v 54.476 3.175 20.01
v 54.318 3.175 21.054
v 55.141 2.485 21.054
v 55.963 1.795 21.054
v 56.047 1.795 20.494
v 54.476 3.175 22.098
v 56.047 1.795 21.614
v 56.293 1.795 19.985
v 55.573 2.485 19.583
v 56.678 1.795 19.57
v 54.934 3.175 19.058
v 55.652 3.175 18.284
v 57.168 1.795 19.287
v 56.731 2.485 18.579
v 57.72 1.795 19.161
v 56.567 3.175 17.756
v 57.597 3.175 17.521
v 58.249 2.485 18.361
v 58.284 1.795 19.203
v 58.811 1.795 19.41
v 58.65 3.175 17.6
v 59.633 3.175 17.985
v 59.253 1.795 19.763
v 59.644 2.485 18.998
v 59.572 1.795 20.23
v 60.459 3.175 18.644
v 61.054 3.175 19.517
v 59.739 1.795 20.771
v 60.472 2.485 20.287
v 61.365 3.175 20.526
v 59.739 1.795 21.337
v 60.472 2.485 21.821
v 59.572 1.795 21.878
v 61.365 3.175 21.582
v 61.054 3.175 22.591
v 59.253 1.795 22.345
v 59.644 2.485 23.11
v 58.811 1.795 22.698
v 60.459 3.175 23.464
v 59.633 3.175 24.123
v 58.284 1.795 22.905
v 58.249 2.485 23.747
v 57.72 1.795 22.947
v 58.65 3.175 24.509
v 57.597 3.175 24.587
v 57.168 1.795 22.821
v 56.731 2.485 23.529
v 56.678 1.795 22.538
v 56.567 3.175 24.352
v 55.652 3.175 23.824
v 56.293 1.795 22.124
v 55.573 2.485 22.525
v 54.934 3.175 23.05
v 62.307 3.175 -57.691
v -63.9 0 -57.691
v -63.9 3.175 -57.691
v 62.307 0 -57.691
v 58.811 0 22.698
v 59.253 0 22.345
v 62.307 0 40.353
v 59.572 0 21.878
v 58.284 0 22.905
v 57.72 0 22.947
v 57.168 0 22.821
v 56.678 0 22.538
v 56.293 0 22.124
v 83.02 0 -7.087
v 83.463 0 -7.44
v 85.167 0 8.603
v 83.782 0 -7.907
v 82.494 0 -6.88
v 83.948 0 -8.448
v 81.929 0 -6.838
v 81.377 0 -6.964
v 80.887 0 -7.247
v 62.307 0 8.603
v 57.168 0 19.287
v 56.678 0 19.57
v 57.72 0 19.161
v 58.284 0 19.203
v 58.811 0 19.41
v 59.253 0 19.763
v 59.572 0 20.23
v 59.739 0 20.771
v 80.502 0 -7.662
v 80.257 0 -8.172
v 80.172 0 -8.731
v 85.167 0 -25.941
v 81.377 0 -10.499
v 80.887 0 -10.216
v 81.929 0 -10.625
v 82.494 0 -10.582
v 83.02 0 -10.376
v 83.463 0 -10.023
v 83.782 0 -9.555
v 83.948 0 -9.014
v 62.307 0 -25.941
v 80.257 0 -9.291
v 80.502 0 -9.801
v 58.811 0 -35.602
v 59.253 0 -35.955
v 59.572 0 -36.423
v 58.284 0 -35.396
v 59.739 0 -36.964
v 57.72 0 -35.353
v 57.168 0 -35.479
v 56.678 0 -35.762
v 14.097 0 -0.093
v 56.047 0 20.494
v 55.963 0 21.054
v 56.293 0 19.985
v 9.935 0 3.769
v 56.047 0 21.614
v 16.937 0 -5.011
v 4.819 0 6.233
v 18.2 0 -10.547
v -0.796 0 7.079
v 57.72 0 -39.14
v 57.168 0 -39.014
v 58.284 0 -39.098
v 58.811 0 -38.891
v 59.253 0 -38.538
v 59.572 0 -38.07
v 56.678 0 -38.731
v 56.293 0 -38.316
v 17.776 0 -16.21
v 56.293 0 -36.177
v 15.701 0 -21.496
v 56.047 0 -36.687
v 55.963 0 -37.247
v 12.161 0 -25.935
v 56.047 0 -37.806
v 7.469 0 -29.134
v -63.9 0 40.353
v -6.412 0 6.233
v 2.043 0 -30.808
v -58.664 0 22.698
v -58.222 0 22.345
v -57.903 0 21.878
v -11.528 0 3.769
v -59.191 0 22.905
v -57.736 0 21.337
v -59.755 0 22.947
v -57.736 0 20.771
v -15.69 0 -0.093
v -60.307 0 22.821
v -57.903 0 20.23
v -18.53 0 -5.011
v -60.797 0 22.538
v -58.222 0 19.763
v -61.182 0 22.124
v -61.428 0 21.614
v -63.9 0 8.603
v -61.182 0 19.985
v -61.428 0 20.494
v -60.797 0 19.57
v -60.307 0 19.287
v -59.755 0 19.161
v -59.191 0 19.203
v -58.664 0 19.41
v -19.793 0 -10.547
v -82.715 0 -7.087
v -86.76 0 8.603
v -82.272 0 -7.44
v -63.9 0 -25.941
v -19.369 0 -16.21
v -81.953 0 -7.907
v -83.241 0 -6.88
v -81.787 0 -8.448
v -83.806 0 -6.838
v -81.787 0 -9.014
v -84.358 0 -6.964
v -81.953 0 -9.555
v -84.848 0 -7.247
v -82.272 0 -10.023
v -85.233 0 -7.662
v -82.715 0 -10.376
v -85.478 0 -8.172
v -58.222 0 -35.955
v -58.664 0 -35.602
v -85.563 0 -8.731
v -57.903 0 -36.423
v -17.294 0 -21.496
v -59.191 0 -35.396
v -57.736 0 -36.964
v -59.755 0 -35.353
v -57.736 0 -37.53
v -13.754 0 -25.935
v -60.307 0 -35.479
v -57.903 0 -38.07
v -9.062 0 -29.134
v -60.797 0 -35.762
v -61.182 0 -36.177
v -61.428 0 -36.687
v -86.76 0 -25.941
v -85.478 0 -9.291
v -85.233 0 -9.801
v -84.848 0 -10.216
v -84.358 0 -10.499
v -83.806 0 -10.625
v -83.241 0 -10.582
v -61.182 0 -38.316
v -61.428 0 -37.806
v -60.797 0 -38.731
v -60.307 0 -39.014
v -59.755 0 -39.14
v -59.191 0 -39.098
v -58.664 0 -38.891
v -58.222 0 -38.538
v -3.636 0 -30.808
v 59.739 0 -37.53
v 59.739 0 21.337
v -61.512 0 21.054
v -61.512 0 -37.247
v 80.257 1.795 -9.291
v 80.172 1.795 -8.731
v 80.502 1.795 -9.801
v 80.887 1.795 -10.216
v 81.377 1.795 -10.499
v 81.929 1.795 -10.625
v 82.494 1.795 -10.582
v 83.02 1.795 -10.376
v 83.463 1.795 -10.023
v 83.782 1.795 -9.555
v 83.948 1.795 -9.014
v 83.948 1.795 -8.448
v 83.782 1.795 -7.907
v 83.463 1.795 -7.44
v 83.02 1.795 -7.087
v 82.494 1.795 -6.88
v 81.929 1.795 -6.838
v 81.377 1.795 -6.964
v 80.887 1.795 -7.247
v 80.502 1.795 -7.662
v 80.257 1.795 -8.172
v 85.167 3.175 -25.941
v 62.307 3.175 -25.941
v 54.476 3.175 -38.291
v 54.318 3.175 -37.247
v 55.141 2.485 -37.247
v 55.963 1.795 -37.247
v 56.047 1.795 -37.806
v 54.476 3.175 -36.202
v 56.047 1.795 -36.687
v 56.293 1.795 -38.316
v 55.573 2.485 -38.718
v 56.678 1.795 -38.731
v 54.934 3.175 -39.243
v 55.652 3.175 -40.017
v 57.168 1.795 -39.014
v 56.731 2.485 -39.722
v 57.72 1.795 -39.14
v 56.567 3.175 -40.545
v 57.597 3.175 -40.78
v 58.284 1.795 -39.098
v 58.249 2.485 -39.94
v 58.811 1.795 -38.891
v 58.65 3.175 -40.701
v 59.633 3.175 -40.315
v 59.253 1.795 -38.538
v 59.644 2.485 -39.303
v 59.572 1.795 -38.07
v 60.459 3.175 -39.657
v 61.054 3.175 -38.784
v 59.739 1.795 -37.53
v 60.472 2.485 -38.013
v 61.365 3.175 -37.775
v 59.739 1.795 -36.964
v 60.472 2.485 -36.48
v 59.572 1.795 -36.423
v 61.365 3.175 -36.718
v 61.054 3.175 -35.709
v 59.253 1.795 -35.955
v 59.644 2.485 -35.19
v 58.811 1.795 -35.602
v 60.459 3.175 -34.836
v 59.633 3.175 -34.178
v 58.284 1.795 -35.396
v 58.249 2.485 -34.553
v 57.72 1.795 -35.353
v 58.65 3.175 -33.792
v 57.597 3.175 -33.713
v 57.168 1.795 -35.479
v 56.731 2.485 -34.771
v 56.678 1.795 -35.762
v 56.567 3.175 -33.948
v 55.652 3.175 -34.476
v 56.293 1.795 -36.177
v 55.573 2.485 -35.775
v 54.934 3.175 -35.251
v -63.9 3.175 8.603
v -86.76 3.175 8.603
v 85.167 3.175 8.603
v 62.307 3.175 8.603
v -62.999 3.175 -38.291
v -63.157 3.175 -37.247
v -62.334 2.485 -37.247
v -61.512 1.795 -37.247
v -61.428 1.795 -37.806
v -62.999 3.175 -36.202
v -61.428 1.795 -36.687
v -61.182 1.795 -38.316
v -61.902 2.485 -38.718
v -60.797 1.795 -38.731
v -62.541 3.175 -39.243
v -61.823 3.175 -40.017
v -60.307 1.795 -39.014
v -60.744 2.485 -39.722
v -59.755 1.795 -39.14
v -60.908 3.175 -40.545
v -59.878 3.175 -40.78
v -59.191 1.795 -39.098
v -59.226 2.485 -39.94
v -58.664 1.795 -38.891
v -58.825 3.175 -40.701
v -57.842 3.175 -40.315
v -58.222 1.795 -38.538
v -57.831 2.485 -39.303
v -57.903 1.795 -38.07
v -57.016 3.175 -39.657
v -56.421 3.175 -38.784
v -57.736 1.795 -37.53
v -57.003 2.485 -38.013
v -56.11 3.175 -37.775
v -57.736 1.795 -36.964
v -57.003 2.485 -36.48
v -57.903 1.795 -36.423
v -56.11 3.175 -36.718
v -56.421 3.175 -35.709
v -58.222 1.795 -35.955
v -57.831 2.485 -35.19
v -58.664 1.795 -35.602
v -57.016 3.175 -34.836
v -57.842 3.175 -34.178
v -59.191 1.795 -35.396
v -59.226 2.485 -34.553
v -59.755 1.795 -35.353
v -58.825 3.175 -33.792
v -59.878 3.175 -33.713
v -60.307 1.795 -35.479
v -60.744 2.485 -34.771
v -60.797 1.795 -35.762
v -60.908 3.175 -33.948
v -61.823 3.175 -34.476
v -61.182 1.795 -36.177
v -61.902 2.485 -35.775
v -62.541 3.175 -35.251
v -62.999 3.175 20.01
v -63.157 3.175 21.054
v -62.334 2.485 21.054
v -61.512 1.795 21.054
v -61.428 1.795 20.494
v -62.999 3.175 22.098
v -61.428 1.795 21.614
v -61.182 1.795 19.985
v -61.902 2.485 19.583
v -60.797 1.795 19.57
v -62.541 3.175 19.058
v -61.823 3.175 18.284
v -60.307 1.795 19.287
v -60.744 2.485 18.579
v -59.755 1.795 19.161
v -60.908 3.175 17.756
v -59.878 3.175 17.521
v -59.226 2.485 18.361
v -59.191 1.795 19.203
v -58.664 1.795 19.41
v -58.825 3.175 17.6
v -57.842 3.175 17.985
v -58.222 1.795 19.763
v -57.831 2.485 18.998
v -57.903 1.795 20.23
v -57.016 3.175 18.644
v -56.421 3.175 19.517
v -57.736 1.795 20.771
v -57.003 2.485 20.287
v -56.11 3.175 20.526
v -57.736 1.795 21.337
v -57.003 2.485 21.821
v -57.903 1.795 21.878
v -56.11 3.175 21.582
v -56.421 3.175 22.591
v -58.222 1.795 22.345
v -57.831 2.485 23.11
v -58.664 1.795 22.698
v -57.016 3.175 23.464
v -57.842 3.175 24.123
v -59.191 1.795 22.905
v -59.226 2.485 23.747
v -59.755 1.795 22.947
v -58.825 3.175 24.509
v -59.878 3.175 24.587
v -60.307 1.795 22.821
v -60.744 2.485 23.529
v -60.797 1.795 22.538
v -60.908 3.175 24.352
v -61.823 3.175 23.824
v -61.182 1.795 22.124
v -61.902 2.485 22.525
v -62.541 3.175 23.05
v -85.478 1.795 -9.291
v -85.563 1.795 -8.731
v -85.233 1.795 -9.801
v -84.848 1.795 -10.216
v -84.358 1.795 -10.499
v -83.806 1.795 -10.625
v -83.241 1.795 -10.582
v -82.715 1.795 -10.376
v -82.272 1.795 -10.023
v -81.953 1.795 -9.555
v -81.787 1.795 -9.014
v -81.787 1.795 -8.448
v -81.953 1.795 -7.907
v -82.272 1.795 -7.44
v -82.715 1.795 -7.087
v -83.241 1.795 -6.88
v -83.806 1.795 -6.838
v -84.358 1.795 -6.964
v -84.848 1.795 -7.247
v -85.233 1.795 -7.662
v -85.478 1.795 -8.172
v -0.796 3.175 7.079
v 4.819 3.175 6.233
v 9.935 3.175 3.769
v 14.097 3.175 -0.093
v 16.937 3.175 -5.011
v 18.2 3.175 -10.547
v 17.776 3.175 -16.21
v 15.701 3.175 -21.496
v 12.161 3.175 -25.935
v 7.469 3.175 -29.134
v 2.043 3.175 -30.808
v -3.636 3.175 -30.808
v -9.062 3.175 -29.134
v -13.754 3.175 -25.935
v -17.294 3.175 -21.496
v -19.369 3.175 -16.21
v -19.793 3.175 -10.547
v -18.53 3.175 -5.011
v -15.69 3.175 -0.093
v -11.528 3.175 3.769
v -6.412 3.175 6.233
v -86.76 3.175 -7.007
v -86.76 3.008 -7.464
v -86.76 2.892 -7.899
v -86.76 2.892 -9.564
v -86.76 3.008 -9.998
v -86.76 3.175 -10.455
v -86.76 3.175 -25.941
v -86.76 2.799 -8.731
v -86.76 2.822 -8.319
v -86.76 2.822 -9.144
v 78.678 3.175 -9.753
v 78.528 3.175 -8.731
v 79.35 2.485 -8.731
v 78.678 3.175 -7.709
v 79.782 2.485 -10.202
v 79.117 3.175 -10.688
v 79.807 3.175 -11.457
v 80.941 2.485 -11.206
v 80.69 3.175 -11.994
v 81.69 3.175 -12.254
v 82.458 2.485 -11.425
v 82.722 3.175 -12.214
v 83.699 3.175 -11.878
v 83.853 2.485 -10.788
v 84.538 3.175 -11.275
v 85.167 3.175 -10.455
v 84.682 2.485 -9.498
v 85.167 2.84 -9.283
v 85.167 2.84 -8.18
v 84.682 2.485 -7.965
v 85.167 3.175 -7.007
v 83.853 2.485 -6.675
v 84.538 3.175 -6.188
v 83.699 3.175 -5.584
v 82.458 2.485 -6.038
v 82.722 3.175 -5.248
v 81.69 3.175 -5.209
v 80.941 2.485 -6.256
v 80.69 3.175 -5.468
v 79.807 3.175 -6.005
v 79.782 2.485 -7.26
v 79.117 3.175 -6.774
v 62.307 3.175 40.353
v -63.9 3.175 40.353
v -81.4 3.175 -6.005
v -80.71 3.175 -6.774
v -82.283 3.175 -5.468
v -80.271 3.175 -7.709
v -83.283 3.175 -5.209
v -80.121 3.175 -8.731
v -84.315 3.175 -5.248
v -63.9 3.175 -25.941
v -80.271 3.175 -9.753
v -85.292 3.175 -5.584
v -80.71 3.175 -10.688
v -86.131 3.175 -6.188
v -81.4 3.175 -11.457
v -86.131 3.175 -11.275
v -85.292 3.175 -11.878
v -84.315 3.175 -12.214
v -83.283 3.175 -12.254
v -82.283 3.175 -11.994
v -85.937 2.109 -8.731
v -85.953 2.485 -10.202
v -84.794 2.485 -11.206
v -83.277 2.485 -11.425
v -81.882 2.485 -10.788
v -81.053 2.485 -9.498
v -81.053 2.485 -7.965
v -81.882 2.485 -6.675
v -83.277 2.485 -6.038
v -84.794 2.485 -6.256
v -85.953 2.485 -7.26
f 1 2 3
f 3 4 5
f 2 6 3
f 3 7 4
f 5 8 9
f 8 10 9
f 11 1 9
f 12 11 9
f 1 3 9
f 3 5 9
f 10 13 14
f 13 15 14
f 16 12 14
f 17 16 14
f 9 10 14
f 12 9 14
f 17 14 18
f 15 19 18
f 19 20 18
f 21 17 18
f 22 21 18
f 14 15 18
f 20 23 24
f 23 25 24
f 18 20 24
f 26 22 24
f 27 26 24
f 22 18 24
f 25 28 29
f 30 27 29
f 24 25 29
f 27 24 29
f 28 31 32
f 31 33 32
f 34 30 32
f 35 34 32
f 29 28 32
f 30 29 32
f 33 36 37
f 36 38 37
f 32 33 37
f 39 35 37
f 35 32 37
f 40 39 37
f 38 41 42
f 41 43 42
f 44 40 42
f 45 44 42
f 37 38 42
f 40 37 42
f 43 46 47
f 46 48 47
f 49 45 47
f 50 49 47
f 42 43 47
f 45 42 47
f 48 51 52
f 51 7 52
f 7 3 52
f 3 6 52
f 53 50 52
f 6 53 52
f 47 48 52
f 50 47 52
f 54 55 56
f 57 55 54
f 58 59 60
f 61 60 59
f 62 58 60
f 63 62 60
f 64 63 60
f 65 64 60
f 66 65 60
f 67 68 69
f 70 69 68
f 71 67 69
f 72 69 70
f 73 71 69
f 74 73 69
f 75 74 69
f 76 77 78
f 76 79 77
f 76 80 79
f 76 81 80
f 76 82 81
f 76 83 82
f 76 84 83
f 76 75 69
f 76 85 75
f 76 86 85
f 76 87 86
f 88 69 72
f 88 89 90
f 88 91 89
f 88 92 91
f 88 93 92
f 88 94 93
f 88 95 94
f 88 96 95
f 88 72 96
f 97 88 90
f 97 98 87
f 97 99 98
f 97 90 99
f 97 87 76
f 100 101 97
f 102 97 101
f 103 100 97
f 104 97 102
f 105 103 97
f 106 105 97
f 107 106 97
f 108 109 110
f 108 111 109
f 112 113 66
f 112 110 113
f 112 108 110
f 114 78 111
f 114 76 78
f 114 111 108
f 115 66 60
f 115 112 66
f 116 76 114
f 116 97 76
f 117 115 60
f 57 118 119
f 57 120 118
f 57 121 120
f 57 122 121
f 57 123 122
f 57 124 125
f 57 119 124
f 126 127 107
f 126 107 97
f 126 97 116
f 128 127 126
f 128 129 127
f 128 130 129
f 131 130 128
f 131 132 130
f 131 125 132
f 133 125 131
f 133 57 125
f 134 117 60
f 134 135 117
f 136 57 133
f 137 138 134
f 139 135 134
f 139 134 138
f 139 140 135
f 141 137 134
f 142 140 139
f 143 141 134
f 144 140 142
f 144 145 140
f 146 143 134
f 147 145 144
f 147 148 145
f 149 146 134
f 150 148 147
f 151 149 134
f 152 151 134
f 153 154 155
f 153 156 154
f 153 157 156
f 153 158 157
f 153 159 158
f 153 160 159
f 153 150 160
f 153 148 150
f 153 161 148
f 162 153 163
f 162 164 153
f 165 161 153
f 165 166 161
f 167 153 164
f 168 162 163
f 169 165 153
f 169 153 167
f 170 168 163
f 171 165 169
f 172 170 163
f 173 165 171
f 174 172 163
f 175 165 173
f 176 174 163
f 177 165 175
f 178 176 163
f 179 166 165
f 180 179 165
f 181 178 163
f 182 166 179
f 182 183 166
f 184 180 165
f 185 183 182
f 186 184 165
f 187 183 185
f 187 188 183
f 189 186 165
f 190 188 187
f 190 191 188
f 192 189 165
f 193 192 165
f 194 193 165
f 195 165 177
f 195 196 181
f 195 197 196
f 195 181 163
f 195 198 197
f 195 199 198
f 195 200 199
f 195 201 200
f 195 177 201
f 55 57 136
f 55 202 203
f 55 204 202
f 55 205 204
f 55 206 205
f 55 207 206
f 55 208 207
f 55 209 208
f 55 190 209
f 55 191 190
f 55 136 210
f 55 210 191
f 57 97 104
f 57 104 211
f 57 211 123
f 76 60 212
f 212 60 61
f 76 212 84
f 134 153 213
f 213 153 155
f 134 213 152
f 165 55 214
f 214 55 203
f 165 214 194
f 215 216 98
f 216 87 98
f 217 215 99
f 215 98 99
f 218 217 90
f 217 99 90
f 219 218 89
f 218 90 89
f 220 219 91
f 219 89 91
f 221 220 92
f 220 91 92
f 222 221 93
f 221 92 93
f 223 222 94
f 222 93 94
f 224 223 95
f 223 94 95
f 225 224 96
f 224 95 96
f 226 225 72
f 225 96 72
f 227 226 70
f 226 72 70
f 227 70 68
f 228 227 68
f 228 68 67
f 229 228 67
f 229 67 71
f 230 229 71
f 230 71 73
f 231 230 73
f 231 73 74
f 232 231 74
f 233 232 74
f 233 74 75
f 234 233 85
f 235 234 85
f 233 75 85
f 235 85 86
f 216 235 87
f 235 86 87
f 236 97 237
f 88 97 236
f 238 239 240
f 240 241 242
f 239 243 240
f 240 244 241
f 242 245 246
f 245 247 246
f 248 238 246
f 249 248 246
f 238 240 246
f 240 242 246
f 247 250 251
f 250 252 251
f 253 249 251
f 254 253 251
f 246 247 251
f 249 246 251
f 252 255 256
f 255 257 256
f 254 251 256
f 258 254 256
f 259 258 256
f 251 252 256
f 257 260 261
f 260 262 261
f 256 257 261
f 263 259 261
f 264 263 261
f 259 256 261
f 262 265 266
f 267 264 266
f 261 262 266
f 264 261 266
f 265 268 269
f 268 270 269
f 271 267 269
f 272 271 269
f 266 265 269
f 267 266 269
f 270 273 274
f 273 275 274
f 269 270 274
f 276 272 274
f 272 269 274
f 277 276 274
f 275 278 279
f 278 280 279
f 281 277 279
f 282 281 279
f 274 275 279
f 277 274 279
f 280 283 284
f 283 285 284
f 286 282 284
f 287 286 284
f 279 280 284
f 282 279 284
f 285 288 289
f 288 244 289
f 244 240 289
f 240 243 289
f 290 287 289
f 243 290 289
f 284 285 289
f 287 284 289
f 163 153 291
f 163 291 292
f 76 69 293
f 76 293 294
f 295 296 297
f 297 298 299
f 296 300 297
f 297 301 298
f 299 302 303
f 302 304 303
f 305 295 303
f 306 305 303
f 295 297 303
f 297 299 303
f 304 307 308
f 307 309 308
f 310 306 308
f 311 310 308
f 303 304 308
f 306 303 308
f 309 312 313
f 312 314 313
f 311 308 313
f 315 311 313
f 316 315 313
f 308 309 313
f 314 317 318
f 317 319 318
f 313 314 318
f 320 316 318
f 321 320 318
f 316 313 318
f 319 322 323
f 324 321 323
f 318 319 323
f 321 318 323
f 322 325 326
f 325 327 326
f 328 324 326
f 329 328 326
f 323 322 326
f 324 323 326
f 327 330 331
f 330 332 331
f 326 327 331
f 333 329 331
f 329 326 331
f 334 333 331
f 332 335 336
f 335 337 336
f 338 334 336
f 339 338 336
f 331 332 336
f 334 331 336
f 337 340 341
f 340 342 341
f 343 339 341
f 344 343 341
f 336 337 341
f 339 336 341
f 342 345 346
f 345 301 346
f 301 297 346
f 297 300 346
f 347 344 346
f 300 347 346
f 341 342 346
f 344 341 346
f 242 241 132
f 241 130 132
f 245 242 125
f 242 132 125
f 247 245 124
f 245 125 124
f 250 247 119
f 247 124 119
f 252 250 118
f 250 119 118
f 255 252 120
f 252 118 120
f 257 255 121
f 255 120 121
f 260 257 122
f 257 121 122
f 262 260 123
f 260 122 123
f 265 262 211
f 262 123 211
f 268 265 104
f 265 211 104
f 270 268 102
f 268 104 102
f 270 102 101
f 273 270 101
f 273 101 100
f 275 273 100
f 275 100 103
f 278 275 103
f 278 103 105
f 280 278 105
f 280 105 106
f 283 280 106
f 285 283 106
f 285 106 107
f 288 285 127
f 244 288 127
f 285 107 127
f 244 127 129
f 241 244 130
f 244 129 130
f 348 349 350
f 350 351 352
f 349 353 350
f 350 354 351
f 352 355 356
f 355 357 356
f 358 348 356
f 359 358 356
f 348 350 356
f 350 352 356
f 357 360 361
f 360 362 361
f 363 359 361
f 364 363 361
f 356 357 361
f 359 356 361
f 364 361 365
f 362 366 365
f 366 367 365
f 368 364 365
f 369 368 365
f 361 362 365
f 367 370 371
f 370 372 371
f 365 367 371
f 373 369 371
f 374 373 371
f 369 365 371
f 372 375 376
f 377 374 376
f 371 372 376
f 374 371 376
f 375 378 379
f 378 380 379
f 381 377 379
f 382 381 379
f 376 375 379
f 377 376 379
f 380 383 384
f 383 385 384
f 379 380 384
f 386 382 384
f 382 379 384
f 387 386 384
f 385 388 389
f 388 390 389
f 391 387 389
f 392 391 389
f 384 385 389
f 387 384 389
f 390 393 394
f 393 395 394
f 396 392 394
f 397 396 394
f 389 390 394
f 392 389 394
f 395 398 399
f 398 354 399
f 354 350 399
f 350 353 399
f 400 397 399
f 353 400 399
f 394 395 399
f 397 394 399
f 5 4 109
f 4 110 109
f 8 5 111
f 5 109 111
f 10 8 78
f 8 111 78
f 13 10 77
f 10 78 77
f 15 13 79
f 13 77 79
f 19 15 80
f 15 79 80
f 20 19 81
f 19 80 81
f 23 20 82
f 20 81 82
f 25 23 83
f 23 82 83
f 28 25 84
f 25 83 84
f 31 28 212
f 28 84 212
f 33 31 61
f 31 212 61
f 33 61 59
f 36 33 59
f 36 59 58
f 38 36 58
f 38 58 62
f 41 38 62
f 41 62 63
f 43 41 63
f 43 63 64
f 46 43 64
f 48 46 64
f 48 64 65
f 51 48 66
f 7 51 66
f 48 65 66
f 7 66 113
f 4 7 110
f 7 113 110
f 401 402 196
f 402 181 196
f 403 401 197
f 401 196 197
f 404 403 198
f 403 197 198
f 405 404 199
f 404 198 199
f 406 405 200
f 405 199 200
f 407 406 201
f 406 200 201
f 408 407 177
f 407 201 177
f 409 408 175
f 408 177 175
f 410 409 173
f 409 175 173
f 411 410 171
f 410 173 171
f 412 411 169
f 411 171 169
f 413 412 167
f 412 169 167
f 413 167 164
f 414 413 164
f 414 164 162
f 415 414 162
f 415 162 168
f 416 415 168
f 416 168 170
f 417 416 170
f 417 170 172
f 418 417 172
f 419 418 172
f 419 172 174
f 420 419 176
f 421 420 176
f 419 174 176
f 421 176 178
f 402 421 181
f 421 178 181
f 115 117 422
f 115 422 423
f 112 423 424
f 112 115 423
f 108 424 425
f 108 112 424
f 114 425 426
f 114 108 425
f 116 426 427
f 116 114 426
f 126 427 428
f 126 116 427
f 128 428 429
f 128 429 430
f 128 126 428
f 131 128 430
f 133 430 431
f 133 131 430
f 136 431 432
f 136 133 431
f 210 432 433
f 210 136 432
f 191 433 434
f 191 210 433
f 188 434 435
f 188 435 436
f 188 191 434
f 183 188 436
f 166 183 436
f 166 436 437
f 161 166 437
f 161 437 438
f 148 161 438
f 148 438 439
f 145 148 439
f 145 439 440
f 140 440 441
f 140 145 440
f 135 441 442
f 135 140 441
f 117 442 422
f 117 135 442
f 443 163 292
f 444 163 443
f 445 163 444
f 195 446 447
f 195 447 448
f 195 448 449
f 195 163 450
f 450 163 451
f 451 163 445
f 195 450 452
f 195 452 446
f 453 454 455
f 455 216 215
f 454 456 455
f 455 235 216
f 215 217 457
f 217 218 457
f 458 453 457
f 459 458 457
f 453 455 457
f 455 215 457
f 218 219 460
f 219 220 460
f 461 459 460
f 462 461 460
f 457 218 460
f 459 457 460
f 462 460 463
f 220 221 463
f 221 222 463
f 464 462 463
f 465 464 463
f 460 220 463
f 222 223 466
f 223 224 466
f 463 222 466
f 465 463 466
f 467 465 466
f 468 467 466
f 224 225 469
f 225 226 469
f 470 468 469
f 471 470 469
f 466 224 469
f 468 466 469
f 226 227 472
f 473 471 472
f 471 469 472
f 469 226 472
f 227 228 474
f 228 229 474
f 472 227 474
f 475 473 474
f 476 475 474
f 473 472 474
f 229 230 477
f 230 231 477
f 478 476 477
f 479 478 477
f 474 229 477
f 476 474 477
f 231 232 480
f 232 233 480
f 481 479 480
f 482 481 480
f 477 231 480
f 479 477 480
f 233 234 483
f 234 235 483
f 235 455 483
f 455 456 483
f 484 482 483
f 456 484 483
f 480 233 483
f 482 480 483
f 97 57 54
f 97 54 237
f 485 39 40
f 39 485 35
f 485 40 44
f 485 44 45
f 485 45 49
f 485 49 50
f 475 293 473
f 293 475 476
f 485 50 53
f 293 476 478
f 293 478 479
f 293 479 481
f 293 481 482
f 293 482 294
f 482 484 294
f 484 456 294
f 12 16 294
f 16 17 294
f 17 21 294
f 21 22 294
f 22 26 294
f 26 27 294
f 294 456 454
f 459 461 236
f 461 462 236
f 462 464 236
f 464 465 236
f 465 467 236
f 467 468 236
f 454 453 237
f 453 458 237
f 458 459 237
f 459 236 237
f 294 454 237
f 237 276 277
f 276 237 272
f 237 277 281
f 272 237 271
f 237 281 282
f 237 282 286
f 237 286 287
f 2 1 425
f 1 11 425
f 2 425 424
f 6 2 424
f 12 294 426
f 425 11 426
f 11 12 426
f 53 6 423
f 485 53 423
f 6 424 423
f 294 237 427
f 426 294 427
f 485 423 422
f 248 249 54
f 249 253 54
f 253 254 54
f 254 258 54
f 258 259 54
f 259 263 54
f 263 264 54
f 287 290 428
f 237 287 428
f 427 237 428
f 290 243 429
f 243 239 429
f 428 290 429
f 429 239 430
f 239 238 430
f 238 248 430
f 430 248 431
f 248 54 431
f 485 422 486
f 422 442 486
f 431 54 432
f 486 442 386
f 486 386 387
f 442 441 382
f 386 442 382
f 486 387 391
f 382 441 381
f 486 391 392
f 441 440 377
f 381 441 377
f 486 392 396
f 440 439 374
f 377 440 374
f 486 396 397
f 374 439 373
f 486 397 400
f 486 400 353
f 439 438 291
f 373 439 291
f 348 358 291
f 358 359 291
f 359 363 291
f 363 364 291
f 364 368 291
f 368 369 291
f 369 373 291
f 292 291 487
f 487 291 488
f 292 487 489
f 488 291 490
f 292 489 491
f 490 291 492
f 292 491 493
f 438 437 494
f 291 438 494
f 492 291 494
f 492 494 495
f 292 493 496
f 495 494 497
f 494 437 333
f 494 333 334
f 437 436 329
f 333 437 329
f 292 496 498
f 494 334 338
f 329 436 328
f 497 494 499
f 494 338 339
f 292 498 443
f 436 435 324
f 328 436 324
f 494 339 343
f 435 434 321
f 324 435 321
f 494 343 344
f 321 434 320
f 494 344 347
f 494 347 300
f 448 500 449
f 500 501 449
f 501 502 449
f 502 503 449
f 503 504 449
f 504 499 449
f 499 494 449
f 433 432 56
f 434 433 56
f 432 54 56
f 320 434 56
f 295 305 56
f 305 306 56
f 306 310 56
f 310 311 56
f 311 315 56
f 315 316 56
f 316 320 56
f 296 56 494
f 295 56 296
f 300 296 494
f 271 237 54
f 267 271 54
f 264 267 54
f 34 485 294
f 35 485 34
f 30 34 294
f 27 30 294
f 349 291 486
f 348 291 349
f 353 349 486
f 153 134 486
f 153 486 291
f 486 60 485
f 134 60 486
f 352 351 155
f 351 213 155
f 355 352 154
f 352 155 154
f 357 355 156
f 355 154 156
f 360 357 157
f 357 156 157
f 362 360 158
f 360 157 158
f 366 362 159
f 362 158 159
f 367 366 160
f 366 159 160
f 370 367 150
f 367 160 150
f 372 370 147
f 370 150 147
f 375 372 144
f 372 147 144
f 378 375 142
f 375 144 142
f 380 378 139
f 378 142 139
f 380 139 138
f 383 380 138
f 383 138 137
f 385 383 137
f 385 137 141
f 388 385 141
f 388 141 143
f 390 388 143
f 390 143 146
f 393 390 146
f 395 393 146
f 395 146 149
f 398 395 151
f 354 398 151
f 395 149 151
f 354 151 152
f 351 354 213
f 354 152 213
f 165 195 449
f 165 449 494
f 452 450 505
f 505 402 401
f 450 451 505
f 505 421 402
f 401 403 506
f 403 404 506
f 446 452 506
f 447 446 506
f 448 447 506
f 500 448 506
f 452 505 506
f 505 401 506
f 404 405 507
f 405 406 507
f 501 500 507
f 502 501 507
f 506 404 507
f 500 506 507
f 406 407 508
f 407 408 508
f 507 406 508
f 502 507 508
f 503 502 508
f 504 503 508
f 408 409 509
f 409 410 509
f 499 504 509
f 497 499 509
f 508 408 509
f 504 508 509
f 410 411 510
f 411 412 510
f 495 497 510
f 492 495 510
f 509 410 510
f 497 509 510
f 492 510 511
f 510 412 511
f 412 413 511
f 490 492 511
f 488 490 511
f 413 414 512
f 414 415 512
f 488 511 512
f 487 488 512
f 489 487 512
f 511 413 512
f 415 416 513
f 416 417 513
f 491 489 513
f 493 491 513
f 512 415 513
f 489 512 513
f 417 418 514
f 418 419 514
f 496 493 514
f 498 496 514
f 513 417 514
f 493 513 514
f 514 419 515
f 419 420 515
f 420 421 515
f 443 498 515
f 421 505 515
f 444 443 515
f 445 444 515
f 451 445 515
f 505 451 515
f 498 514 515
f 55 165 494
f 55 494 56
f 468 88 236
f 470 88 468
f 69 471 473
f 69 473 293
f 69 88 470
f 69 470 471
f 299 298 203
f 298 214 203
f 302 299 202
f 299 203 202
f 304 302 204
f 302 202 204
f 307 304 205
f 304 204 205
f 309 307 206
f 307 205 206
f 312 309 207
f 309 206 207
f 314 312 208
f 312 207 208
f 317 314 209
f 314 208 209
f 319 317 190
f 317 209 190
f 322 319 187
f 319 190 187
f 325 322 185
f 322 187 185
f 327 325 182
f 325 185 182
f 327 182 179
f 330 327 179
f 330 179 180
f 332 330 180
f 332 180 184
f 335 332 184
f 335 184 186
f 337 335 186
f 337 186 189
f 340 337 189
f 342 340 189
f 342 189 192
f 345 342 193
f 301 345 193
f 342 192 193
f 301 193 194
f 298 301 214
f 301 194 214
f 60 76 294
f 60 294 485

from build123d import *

# Parameters (mm, degrees)
SKETCH1_R                                         = 19.05
BOSS_EXTRUDE1_DEPTH                               = 3.175
CSK_FOR_6_FLAT_HEAD_MACHINE_SCREW_100_D           = 3.7973
CSK_FOR_6_FLAT_HEAD_MACHINE_SCREW_100_CSINK_D     = 7.0866
CSK_FOR_6_FLAT_HEAD_MACHINE_SCREW_100_CSINK_ANGLE = 100
CSK_FOR_6_FLAT_HEAD_MACHINE_SCREW_2_D             = 3.7973
CSK_FOR_6_FLAT_HEAD_MACHINE_SCREW_2_CSINK_D       = 7.0866
CSK_FOR_6_FLAT_HEAD_MACHINE_SCREW_2_CSINK_ANGLE   = 100


with BuildPart() as part:
    # Sketch1 → Boss-Extrude1 (new body)
    with BuildSketch(Plane(origin=(0, 0, 0), x_dir=(1, 0, 0), z_dir=(0, 1, 0))):
        Polygon((-63.899577335, 57.690677645), (62.306672665, 57.690677645), (62.306672665, 25.940677645), (85.166672665, 25.940677645), (85.166672665, -8.603322355), (62.306672665, -8.603322355), (62.306672665, -40.353322355), (-63.899577335, -40.353322355), (-63.899577335, -8.603322355), (-86.759577335, -8.603322355), (-86.759577335, 25.940677645), (-63.899577335, 25.940677645), align=None)
        with Locations(Location((-0.796452335, 11.970677645, 0), (0, 0, 270))):
            Circle(SKETCH1_R, mode=Mode.SUBTRACT)
    extrude(amount=BOSS_EXTRUDE1_DEPTH)

    # CSK for _6 Flat Head Machine Screw _100 (through all)
    with Locations(Plane(origin=(0, 3.175, 0), x_dir=(1, 0, 0), z_dir=(0, 1, 0))):
        with Locations((-59.613327335, 37.246553163), (-59.613327335, -21.054053163), (57.861672665, -21.054053163), (57.861672665, 37.246553163)):
            CounterSinkHole(CSK_FOR_6_FLAT_HEAD_MACHINE_SCREW_100_D / 2, CSK_FOR_6_FLAT_HEAD_MACHINE_SCREW_100_CSINK_D / 2, counter_sink_angle=CSK_FOR_6_FLAT_HEAD_MACHINE_SCREW_100_CSINK_ANGLE)

    # CSK for _6 Flat Head Machine Screw _ 2 (through all)
    with Locations(Plane(origin=(0, 3.175, 0), x_dir=(1, 0, 0), z_dir=(0, 1, 0))):
        with Locations((82.071047665, 8.73125), (-83.663952335, 8.73125)):
            CounterSinkHole(CSK_FOR_6_FLAT_HEAD_MACHINE_SCREW_2_D / 2, CSK_FOR_6_FLAT_HEAD_MACHINE_SCREW_2_CSINK_D / 2, counter_sink_angle=CSK_FOR_6_FLAT_HEAD_MACHINE_SCREW_2_CSINK_ANGLE)


solid = part.part
